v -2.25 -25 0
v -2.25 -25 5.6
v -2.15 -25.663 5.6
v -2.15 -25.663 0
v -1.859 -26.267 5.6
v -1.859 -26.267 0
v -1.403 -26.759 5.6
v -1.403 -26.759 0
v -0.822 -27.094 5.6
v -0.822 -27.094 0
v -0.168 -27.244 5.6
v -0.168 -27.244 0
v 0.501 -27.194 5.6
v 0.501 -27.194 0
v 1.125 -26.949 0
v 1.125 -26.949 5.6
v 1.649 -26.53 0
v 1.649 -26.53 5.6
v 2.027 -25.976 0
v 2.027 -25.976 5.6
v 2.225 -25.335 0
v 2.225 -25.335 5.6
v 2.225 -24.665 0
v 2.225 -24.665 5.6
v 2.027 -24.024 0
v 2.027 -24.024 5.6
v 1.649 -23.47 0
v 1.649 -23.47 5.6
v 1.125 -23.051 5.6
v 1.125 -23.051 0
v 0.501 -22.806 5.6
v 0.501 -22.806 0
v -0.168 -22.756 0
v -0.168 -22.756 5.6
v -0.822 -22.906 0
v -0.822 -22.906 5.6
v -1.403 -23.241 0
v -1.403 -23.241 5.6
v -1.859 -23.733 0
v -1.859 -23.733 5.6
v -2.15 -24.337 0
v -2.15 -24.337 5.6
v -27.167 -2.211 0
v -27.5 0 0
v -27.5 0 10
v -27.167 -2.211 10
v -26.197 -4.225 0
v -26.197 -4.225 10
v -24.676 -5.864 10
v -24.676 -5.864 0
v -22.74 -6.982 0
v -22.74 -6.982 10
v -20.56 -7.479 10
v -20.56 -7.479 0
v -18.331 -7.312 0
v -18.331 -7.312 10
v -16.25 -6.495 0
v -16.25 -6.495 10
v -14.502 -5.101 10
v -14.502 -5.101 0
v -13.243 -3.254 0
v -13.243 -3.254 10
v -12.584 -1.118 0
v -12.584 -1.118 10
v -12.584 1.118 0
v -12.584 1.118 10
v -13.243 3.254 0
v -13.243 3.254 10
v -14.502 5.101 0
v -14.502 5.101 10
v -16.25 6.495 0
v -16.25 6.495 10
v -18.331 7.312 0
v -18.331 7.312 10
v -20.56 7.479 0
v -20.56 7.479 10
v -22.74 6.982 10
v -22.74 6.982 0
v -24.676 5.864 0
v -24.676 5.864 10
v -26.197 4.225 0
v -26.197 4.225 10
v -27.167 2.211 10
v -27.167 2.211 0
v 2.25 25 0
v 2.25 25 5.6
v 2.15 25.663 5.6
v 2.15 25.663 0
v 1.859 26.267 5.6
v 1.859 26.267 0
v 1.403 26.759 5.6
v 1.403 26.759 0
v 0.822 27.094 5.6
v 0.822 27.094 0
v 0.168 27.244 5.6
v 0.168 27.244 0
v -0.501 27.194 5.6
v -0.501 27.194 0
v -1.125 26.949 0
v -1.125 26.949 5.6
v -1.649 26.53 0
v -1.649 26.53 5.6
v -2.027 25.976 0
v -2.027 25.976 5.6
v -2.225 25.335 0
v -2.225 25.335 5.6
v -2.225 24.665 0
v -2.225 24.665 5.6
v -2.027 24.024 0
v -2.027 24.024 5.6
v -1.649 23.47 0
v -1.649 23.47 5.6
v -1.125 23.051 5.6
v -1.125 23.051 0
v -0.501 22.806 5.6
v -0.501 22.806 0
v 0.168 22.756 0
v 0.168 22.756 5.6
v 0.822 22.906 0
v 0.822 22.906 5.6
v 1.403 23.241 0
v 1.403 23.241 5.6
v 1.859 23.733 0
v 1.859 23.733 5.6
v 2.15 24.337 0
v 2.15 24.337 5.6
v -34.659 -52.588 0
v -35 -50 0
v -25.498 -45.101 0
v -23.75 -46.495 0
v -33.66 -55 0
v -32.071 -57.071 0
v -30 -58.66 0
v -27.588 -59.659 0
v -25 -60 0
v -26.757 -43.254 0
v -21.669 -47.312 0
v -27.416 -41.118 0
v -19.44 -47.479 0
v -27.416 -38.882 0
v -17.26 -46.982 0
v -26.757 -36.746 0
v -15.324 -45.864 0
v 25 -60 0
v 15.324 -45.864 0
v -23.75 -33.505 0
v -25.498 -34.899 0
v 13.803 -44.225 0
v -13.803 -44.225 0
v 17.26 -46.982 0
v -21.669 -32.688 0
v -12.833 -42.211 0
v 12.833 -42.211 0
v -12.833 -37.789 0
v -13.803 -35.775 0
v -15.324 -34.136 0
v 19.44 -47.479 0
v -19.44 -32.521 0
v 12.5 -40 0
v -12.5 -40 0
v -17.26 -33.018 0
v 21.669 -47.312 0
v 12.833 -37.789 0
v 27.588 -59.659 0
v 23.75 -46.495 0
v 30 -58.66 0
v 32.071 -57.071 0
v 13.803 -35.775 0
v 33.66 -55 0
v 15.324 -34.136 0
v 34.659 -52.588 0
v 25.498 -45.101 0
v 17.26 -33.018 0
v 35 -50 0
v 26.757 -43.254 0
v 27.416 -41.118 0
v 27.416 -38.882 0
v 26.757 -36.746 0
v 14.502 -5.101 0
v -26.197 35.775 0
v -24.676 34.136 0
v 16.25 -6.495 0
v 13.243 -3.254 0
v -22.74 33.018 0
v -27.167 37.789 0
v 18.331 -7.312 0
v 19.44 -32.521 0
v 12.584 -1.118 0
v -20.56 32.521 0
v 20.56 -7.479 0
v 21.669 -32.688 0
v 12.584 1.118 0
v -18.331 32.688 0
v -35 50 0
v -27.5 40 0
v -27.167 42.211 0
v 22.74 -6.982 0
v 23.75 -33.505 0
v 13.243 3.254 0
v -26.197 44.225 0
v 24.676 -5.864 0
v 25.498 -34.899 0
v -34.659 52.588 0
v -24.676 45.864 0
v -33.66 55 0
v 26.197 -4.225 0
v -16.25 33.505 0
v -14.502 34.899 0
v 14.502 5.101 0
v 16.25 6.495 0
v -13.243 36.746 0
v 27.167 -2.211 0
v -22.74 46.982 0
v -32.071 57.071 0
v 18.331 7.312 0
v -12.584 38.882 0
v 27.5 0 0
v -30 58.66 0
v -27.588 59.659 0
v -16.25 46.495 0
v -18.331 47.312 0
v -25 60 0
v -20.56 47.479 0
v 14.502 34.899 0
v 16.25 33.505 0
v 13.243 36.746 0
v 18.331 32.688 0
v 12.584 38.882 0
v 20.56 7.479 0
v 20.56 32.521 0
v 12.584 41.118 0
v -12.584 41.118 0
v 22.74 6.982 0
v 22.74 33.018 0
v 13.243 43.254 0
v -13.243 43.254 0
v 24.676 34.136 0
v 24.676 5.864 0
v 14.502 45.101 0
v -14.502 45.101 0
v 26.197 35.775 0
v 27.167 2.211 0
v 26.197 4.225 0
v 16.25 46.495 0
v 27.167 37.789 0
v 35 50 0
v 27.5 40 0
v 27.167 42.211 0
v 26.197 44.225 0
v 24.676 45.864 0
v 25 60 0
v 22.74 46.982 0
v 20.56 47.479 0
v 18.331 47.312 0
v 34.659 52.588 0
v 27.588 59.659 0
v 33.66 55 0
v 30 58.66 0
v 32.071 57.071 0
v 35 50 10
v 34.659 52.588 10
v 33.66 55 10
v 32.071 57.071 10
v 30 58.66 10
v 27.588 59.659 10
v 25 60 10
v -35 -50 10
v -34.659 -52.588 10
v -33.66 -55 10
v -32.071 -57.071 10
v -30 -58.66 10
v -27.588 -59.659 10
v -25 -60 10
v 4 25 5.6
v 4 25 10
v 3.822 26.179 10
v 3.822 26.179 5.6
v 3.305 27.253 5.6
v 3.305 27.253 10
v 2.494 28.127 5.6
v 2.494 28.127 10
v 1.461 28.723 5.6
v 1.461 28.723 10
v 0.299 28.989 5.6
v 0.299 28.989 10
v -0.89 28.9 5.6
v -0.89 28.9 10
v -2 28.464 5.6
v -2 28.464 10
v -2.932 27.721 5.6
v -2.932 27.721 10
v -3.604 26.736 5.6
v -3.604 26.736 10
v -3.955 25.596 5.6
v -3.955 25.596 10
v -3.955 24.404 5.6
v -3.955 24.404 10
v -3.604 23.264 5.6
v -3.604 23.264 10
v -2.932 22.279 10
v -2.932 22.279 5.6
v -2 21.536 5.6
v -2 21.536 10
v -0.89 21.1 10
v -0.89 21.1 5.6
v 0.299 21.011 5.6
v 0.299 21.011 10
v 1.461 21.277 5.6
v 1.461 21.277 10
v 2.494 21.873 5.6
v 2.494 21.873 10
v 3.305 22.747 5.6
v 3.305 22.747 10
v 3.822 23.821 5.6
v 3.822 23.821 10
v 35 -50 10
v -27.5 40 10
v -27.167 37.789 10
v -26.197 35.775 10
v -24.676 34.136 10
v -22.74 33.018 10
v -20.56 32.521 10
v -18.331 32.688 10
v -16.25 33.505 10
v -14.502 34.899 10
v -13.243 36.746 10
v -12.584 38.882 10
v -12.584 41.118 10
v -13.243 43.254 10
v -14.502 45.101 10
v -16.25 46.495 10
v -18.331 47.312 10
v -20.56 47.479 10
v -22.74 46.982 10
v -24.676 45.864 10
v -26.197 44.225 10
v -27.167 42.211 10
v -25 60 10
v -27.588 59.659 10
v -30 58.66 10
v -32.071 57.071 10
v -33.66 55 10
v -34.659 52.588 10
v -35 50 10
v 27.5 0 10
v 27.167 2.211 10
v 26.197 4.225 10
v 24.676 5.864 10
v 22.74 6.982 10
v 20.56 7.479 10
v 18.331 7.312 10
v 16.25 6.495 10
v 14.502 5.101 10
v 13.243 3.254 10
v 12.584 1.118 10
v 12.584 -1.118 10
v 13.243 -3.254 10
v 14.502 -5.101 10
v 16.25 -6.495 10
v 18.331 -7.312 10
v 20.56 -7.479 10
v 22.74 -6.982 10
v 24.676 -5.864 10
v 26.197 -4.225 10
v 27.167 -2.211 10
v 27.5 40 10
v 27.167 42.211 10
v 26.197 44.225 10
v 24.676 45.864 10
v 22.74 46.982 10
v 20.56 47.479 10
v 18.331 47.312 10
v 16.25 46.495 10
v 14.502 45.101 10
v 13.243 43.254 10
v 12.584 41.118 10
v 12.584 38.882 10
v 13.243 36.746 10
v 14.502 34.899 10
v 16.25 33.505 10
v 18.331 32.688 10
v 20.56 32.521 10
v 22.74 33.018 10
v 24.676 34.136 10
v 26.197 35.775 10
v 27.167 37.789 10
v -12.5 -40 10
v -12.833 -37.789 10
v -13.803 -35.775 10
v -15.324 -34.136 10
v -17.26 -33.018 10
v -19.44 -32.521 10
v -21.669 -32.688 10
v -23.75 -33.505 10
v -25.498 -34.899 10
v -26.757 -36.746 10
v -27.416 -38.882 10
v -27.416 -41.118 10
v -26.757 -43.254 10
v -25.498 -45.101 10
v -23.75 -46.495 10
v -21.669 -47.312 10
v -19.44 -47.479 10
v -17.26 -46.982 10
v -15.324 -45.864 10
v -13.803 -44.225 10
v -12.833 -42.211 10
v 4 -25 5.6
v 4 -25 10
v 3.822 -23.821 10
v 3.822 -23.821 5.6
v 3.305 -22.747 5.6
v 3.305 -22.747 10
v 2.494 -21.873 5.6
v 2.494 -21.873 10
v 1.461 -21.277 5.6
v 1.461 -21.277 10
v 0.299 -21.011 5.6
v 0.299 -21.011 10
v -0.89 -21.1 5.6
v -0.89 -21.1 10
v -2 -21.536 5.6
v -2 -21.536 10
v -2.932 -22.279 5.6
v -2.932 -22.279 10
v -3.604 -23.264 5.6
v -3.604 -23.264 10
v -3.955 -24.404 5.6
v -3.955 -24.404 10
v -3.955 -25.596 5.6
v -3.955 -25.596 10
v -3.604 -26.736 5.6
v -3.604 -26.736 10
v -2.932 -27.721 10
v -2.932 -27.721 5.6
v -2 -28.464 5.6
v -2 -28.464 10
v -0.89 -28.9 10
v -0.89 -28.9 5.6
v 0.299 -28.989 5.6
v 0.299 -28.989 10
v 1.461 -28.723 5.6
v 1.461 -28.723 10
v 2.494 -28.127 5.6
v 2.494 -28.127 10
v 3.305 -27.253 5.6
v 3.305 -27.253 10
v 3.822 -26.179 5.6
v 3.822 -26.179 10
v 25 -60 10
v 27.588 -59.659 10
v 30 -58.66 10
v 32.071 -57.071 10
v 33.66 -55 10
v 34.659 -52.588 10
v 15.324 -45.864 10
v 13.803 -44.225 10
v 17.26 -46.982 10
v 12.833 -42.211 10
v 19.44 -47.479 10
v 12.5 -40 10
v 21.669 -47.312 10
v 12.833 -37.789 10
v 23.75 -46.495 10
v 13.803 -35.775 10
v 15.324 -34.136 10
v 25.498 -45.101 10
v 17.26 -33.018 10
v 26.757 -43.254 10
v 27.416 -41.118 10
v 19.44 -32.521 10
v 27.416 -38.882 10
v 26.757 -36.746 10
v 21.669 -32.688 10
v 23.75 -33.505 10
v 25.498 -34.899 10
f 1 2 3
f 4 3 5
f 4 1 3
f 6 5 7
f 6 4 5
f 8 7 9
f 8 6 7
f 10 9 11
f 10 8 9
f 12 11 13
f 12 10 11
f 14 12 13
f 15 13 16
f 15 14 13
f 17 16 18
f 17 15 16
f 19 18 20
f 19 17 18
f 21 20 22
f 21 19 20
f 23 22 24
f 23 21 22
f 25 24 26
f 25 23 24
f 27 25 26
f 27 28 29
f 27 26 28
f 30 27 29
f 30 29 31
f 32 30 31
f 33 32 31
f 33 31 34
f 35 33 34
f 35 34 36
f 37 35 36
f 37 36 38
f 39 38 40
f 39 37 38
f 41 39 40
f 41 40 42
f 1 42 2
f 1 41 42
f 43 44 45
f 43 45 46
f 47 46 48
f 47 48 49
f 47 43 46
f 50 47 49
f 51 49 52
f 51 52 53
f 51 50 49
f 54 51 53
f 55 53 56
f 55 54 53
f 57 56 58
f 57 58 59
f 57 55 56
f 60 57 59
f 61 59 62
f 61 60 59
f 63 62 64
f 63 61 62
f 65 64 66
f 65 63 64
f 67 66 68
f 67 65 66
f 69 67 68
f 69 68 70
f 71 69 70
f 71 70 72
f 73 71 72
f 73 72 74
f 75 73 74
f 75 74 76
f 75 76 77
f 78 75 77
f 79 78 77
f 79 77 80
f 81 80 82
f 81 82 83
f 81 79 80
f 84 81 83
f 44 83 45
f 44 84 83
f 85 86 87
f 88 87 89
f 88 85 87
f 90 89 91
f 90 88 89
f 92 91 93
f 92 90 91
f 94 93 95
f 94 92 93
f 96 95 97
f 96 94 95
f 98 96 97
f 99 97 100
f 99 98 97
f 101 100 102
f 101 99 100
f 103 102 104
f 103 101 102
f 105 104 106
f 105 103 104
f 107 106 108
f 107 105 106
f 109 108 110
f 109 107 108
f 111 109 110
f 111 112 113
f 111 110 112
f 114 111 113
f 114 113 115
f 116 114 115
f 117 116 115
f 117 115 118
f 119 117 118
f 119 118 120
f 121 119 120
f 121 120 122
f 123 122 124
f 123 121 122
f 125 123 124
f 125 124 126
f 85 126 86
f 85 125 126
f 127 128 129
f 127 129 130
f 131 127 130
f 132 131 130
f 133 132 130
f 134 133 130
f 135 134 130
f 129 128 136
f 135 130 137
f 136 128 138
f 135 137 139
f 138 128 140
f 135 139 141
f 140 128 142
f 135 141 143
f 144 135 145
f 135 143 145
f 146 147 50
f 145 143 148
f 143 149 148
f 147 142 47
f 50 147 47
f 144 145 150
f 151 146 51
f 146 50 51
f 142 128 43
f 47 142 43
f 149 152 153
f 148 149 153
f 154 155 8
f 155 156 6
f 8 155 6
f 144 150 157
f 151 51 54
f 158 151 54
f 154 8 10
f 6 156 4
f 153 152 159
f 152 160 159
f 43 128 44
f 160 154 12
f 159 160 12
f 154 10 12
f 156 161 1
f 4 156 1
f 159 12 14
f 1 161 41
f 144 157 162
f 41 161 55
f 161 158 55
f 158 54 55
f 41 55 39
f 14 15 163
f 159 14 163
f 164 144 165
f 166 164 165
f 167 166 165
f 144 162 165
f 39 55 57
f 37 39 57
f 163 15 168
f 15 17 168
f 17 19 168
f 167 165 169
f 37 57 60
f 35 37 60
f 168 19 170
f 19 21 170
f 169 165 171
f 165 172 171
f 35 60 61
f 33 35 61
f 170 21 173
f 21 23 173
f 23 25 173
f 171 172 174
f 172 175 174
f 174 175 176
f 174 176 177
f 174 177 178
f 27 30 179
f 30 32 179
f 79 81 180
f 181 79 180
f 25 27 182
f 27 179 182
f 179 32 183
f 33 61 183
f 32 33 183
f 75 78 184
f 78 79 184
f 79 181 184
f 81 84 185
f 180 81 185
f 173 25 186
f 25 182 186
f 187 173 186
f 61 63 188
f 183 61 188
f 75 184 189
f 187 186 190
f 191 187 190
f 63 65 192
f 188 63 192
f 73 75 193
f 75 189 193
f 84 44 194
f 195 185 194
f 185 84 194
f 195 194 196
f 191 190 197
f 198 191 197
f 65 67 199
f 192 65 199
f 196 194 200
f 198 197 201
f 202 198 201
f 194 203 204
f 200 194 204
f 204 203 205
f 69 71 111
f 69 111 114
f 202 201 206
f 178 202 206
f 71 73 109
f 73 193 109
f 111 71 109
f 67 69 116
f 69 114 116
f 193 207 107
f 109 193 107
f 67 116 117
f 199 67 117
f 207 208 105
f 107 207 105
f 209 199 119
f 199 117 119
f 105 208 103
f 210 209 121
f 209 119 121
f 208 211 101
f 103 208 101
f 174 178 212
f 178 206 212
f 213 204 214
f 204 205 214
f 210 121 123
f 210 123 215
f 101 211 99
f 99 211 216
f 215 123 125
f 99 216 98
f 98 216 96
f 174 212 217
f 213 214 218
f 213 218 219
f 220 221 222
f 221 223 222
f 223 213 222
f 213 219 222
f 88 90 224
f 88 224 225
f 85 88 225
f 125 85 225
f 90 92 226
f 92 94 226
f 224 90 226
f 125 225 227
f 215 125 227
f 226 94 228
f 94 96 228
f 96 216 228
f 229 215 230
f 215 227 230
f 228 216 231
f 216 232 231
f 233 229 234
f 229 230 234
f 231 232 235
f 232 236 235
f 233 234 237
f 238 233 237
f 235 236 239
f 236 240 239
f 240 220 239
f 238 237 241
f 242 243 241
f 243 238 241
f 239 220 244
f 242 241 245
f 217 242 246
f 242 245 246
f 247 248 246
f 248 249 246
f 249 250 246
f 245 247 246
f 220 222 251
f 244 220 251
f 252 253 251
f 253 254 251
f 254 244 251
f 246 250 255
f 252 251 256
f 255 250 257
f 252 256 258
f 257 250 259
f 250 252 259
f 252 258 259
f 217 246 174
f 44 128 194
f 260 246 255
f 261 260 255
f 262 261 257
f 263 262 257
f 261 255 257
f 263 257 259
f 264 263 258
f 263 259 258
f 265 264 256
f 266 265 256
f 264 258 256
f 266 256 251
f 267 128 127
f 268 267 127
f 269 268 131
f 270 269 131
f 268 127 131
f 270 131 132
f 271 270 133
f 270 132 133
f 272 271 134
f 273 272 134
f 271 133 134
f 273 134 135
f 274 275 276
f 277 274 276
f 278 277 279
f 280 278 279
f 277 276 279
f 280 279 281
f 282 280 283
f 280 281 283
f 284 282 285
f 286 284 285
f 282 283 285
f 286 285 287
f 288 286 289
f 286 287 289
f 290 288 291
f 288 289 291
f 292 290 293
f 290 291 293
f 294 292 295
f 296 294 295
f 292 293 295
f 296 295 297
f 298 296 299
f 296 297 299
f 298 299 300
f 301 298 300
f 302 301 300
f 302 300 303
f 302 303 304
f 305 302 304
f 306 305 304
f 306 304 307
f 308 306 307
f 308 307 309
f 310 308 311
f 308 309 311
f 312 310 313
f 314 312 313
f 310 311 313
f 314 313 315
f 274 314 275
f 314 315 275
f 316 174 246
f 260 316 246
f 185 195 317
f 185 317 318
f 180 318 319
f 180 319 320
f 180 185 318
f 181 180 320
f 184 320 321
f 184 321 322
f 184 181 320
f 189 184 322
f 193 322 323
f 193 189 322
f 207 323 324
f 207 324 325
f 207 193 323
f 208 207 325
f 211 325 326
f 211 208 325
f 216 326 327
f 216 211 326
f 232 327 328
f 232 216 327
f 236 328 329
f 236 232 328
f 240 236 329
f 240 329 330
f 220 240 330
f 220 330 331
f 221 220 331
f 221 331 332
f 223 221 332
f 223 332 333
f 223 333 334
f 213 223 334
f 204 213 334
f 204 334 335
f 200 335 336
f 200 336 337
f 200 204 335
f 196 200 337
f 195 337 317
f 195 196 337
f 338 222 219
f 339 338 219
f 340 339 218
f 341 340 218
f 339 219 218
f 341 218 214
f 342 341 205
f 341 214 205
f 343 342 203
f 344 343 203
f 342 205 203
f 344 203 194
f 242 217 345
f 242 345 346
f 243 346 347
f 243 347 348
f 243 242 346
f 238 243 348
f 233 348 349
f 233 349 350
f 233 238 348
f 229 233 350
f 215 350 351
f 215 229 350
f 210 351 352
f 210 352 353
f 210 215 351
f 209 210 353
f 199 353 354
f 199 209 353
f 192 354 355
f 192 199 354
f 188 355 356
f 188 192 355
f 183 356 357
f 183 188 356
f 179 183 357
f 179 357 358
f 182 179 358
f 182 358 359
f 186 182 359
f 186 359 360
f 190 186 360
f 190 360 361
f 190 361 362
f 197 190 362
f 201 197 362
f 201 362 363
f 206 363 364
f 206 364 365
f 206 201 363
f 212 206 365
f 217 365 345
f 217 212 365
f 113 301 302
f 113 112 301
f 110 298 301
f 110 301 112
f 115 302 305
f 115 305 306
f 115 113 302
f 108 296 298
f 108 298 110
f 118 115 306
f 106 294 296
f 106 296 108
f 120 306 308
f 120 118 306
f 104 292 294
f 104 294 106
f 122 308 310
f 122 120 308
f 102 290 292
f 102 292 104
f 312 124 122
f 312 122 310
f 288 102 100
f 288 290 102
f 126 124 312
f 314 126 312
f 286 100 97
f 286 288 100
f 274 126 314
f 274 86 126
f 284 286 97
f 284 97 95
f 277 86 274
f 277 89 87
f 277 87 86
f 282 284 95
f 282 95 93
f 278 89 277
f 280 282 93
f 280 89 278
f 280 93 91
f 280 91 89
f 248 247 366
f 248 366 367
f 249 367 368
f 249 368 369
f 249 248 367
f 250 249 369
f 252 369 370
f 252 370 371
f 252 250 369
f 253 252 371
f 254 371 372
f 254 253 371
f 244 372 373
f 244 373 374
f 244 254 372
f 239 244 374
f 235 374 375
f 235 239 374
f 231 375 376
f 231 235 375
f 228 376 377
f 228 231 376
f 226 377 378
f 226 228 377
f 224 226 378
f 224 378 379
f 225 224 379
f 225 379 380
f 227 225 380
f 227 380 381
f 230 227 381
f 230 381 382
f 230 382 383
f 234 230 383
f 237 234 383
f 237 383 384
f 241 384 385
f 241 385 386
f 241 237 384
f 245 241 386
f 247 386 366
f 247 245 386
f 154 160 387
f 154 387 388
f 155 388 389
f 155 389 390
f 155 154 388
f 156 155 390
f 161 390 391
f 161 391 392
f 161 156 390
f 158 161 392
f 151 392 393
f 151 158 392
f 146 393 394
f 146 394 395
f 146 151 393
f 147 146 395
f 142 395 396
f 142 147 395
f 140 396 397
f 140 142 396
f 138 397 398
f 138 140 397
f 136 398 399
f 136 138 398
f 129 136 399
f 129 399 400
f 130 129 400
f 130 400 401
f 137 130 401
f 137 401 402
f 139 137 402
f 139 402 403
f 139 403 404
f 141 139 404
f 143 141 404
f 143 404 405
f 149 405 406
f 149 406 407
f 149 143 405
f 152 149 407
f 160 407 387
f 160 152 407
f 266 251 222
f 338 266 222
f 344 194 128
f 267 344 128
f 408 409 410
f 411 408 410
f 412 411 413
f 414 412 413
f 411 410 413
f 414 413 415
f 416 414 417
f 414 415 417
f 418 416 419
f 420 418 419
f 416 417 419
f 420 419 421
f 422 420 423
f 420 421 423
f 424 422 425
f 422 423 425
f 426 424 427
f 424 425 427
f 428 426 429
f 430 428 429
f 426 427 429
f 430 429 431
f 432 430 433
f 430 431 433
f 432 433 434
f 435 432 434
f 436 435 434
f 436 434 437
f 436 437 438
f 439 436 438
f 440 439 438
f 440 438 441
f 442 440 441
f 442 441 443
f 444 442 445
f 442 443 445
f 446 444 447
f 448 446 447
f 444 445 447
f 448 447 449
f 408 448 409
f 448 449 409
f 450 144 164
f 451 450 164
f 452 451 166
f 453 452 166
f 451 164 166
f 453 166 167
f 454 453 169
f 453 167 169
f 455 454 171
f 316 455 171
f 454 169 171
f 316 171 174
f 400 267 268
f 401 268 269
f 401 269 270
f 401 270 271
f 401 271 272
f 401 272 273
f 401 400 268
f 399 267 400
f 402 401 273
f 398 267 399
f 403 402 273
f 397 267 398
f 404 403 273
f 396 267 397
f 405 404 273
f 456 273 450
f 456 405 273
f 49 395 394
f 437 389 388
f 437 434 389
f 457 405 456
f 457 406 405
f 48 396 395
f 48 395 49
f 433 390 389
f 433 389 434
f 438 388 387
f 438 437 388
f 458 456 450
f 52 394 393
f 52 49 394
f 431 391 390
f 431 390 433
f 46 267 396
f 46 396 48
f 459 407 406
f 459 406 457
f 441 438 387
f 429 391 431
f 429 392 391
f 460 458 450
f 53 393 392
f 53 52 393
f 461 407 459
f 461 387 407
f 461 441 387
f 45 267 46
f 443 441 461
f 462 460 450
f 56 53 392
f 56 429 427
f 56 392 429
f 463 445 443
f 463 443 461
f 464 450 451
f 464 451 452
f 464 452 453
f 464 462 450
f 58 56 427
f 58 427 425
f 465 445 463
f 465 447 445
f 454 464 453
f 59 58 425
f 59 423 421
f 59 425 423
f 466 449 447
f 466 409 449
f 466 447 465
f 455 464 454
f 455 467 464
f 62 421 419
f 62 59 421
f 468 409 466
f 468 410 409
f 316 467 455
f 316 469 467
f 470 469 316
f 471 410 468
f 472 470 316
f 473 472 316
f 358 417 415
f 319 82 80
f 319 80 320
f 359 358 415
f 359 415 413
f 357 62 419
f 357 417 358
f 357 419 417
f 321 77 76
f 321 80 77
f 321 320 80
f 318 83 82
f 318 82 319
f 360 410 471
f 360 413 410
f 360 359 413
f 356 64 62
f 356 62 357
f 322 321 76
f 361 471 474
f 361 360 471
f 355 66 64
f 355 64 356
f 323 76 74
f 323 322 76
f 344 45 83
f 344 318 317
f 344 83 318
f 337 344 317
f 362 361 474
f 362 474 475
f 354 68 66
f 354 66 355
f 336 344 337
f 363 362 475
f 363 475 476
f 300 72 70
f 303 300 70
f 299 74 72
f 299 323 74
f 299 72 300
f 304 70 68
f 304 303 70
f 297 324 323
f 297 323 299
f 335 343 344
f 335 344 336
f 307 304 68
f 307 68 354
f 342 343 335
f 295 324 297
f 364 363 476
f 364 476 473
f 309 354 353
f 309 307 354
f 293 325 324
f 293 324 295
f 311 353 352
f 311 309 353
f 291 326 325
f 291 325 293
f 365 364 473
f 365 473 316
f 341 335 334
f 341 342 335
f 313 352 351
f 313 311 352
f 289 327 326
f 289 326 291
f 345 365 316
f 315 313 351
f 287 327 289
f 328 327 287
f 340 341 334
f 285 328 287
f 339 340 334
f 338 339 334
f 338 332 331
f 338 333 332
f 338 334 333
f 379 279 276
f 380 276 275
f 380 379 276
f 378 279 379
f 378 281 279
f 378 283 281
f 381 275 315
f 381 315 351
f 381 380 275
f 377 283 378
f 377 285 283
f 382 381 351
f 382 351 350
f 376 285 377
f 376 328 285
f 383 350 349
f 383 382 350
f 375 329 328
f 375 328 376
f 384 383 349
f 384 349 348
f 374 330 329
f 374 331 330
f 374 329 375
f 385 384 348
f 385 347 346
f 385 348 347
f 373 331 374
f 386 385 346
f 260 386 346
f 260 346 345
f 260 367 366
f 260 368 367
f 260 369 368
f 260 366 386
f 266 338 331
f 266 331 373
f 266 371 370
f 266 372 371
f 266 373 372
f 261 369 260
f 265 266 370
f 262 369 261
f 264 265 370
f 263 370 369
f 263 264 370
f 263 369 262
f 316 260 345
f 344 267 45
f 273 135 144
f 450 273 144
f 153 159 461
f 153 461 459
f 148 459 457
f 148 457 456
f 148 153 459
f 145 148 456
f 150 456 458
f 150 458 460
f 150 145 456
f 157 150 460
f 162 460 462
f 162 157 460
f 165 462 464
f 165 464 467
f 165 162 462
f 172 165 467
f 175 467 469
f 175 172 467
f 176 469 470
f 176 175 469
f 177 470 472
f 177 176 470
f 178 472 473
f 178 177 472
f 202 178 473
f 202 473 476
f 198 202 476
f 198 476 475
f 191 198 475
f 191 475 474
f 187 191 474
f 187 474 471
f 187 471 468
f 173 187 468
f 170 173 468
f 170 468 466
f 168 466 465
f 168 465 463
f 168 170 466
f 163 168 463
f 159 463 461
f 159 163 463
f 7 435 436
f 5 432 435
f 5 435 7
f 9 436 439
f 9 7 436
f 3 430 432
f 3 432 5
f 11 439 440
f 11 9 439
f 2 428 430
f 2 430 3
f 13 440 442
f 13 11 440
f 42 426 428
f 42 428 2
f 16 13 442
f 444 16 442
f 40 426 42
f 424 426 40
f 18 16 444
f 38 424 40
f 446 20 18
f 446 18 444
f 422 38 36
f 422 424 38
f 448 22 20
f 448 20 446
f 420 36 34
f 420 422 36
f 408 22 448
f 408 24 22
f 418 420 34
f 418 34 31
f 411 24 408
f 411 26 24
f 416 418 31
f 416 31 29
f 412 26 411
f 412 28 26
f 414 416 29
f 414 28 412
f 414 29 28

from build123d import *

# Parameters (mm, degrees)
SKETCH_1_R          = 7.5
SKETCH_1_R_2        = 2.25
EXTRUDE_1_DEPTH     = 10
SKETCH_2_R          = 4
CUT_EXTRUDE_1_DEPTH = 4.4


with BuildPart() as part:
    # 草图1 → 凸台-拉伸1 (new body)
    with BuildSketch(Plane.XY):
        with BuildLine():
            Line((-25, -60), (25, -60))
            ThreePointArc((25, -60), (32.071067812, -57.071067812), (35, -50))
            Line((35, -50), (35, 50))
            ThreePointArc((35, 50), (32.071067812, 57.071067812), (25, 60))
            Line((25, 60), (-25, 60))
            ThreePointArc((-25, 60), (-32.071067812, 57.071067812), (-35, 50))
            Line((-35, 50), (-35, -50))
            ThreePointArc((-35, -50), (-32.071067812, -57.071067812), (-25, -60))
        make_face()
        with Locations((20, 40)):
            Circle(SKETCH_1_R, mode=Mode.SUBTRACT)
        with Locations((20, 0)):
            Circle(SKETCH_1_R, mode=Mode.SUBTRACT)
        with Locations(Location((20, -40, 0), (0, 0, 180))):
            Circle(SKETCH_1_R, mode=Mode.SUBTRACT)
        with Locations((-20, -40)):
            Circle(SKETCH_1_R, mode=Mode.SUBTRACT)
        with Locations(Location((-20, 0, 0), (0, 0, 180))):
            Circle(SKETCH_1_R, mode=Mode.SUBTRACT)
        with Locations(Location((-20, 40, 0), (0, 0, 180))):
            Circle(SKETCH_1_R, mode=Mode.SUBTRACT)
        with Locations((0, 25)):
            Circle(SKETCH_1_R_2, mode=Mode.SUBTRACT)
        with Locations(Location((0, -25, 0), (0, 0, 180))):
            Circle(SKETCH_1_R_2, mode=Mode.SUBTRACT)
    extrude(amount=EXTRUDE_1_DEPTH)

    # 草图2 → 切除-拉伸1 (cut)
    with BuildSketch(Plane.XY.offset(10)):
        with Locations((0, 25)):
            Circle(SKETCH_2_R)
        with Locations((0, -25)):
            Circle(SKETCH_2_R)
    extrude(amount=-CUT_EXTRUDE_1_DEPTH, mode=Mode.SUBTRACT)


solid = part.part
